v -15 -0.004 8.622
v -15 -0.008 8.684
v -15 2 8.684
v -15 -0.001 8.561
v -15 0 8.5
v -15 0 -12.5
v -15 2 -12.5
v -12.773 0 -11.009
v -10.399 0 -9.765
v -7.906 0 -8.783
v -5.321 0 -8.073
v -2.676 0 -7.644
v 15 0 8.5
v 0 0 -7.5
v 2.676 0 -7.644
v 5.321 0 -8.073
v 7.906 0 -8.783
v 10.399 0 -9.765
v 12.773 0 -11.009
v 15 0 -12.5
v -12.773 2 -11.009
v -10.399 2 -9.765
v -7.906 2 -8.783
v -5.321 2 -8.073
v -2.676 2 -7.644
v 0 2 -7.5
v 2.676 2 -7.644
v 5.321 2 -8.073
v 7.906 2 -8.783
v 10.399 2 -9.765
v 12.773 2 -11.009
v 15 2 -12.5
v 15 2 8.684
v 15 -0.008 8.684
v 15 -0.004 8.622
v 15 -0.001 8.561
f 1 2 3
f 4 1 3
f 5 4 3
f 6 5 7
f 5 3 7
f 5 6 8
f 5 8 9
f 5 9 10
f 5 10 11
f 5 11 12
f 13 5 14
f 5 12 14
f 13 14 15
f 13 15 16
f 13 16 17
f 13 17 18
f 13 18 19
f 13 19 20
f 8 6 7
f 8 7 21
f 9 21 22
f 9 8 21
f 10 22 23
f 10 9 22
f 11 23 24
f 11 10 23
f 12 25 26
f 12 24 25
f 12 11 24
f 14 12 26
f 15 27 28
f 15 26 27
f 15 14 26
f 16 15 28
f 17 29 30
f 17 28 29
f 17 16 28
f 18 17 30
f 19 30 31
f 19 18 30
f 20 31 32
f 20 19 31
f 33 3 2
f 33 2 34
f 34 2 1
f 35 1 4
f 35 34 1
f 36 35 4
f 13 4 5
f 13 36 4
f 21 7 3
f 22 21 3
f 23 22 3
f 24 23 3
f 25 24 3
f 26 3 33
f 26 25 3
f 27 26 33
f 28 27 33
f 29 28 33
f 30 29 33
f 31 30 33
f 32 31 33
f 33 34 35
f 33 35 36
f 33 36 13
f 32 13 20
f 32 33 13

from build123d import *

# Parameters (mm, degrees)
SKETCH1_W           = 30
SKETCH1_H           = 25
BOSS_EXTRUDE1_DEPTH = 2
SKETCH2_W           = 30
SKETCH2_H           = 2
BOSS_EXTRUDE2_DEPTH = 12.5
CUT_EXTRUDE1_REACH  = 25.184
SKETCH3_R           = 25
FILLET1_R           = 2
CUT_EXTRUDE2_REACH  = 26.321
SKETCH4_W           = 35.566243018
SKETCH4_H           = 17.679126646


with BuildPart() as part:
    # Sketch1 → Boss-Extrude1 (new body)
    with BuildSketch(Plane(origin=(0, 0, 0), x_dir=(1, 0, 0), z_dir=(0, 1, 0))):
        Rectangle(SKETCH1_W, SKETCH1_H)
    extrude(amount=BOSS_EXTRUDE1_DEPTH)

    # Sketch2 → Boss-Extrude2 (add)
    with BuildSketch(Plane(origin=(0, 0, 0), x_dir=(1, 0, 0), z_dir=(0, 1, 0))):
        with Locations((0, -11.5)):
            Rectangle(SKETCH2_W, SKETCH2_H)
    extrude(amount=-BOSS_EXTRUDE2_DEPTH)

    # Sketch3 → Cut-Extrude1 (cut, up to next)
    with BuildSketch(Plane(origin=(0, 0, 0), x_dir=(1, 0, 0), z_dir=(0, 1, 0)), mode=Mode.PRIVATE) as cut_extrude1_sk1:
        with Locations((0, 32.5)):
            Circle(SKETCH3_R)
    cut_extrude1_tool1 = extrude(cut_extrude1_sk1.sketch, amount=CUT_EXTRUDE1_REACH, mode=Mode.PRIVATE) & part.part
    add(cut_extrude1_tool1.solids().sort_by_distance((0, 0, -32.5))[0], mode=Mode.SUBTRACT)

    # Fillet1
    fillet1_edges = [part.edges().sort_by_distance(p)[0] for p in [
        (0, 0, 10.5),
    ]]
    fillet(fillet1_edges, radius=FILLET1_R)

    # Sketch4 → Cut-Extrude2 (cut, up to next)
    with BuildSketch(Plane(origin=(0, 2, 0), x_dir=(1, 0, 0), z_dir=(0, 1, 0)), mode=Mode.PRIVATE) as cut_extrude2_sk1:
        with Locations((0, -17.523134352)):
            Rectangle(SKETCH4_W, SKETCH4_H)
    cut_extrude2_tool1 = extrude(cut_extrude2_sk1.sketch, amount=-CUT_EXTRUDE2_REACH, mode=Mode.PRIVATE) & part.part
    add(cut_extrude2_tool1.solids().sort_by_distance((0, 2, 17.523134))[0], mode=Mode.SUBTRACT)


solid = part.part
